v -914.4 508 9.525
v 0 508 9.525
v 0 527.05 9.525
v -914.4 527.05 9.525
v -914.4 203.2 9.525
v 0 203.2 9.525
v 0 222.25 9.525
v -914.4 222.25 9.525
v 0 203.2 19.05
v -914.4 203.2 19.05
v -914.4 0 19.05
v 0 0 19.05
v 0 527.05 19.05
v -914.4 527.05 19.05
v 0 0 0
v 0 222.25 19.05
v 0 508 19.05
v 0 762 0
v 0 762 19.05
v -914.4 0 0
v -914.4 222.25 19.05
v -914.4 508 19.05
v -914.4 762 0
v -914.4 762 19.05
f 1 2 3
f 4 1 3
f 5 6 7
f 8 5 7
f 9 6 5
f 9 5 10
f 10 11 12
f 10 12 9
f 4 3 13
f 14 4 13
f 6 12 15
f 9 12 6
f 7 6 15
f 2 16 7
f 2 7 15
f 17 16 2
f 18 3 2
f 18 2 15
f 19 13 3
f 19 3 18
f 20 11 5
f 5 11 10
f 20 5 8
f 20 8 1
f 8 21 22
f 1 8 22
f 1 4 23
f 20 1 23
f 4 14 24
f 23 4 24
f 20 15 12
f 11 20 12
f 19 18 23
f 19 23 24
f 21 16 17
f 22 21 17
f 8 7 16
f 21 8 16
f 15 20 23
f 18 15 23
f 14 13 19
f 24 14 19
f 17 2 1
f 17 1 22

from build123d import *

# Parameters (mm, degrees)
F0_W     = 762
F0_H     = 19.05
F1_DEPTH = 914.4
F2_W     = 19.05
F2_H     = 9.525
F3_DEPTH = 914.401
F4_W     = 38.1
F4_H     = 38.1
F5_DEPTH = 711.2


with BuildPart() as f1:
    # F0 (on Right) → F1 (new body)
    with BuildSketch(Plane.YZ):
        with Locations((381, 9.525)):
            Rectangle(F0_W, F0_H)
    extrude(amount=-F1_DEPTH)

    # F2 (on face) → F3 (cut, through all)
    with BuildSketch(Plane.YZ):
        with Locations((212.725, 14.2875)):
            Rectangle(F2_W, F2_H)
        with Locations((517.525, 14.2875)):
            Rectangle(F2_W, F2_H)
    extrude(amount=-F3_DEPTH, mode=Mode.SUBTRACT)


with BuildPart() as f5:
    # F4 (on face) → F5 (new body)
    with BuildSketch(Plane(origin=(0, 0, 0), x_dir=(1, 0, 0), z_dir=(0, 0, -1))):
        with Locations((-895.35, -31.75)):
            Rectangle(F4_W, F4_H)
    extrude(amount=F5_DEPTH)


solid = f1.part
